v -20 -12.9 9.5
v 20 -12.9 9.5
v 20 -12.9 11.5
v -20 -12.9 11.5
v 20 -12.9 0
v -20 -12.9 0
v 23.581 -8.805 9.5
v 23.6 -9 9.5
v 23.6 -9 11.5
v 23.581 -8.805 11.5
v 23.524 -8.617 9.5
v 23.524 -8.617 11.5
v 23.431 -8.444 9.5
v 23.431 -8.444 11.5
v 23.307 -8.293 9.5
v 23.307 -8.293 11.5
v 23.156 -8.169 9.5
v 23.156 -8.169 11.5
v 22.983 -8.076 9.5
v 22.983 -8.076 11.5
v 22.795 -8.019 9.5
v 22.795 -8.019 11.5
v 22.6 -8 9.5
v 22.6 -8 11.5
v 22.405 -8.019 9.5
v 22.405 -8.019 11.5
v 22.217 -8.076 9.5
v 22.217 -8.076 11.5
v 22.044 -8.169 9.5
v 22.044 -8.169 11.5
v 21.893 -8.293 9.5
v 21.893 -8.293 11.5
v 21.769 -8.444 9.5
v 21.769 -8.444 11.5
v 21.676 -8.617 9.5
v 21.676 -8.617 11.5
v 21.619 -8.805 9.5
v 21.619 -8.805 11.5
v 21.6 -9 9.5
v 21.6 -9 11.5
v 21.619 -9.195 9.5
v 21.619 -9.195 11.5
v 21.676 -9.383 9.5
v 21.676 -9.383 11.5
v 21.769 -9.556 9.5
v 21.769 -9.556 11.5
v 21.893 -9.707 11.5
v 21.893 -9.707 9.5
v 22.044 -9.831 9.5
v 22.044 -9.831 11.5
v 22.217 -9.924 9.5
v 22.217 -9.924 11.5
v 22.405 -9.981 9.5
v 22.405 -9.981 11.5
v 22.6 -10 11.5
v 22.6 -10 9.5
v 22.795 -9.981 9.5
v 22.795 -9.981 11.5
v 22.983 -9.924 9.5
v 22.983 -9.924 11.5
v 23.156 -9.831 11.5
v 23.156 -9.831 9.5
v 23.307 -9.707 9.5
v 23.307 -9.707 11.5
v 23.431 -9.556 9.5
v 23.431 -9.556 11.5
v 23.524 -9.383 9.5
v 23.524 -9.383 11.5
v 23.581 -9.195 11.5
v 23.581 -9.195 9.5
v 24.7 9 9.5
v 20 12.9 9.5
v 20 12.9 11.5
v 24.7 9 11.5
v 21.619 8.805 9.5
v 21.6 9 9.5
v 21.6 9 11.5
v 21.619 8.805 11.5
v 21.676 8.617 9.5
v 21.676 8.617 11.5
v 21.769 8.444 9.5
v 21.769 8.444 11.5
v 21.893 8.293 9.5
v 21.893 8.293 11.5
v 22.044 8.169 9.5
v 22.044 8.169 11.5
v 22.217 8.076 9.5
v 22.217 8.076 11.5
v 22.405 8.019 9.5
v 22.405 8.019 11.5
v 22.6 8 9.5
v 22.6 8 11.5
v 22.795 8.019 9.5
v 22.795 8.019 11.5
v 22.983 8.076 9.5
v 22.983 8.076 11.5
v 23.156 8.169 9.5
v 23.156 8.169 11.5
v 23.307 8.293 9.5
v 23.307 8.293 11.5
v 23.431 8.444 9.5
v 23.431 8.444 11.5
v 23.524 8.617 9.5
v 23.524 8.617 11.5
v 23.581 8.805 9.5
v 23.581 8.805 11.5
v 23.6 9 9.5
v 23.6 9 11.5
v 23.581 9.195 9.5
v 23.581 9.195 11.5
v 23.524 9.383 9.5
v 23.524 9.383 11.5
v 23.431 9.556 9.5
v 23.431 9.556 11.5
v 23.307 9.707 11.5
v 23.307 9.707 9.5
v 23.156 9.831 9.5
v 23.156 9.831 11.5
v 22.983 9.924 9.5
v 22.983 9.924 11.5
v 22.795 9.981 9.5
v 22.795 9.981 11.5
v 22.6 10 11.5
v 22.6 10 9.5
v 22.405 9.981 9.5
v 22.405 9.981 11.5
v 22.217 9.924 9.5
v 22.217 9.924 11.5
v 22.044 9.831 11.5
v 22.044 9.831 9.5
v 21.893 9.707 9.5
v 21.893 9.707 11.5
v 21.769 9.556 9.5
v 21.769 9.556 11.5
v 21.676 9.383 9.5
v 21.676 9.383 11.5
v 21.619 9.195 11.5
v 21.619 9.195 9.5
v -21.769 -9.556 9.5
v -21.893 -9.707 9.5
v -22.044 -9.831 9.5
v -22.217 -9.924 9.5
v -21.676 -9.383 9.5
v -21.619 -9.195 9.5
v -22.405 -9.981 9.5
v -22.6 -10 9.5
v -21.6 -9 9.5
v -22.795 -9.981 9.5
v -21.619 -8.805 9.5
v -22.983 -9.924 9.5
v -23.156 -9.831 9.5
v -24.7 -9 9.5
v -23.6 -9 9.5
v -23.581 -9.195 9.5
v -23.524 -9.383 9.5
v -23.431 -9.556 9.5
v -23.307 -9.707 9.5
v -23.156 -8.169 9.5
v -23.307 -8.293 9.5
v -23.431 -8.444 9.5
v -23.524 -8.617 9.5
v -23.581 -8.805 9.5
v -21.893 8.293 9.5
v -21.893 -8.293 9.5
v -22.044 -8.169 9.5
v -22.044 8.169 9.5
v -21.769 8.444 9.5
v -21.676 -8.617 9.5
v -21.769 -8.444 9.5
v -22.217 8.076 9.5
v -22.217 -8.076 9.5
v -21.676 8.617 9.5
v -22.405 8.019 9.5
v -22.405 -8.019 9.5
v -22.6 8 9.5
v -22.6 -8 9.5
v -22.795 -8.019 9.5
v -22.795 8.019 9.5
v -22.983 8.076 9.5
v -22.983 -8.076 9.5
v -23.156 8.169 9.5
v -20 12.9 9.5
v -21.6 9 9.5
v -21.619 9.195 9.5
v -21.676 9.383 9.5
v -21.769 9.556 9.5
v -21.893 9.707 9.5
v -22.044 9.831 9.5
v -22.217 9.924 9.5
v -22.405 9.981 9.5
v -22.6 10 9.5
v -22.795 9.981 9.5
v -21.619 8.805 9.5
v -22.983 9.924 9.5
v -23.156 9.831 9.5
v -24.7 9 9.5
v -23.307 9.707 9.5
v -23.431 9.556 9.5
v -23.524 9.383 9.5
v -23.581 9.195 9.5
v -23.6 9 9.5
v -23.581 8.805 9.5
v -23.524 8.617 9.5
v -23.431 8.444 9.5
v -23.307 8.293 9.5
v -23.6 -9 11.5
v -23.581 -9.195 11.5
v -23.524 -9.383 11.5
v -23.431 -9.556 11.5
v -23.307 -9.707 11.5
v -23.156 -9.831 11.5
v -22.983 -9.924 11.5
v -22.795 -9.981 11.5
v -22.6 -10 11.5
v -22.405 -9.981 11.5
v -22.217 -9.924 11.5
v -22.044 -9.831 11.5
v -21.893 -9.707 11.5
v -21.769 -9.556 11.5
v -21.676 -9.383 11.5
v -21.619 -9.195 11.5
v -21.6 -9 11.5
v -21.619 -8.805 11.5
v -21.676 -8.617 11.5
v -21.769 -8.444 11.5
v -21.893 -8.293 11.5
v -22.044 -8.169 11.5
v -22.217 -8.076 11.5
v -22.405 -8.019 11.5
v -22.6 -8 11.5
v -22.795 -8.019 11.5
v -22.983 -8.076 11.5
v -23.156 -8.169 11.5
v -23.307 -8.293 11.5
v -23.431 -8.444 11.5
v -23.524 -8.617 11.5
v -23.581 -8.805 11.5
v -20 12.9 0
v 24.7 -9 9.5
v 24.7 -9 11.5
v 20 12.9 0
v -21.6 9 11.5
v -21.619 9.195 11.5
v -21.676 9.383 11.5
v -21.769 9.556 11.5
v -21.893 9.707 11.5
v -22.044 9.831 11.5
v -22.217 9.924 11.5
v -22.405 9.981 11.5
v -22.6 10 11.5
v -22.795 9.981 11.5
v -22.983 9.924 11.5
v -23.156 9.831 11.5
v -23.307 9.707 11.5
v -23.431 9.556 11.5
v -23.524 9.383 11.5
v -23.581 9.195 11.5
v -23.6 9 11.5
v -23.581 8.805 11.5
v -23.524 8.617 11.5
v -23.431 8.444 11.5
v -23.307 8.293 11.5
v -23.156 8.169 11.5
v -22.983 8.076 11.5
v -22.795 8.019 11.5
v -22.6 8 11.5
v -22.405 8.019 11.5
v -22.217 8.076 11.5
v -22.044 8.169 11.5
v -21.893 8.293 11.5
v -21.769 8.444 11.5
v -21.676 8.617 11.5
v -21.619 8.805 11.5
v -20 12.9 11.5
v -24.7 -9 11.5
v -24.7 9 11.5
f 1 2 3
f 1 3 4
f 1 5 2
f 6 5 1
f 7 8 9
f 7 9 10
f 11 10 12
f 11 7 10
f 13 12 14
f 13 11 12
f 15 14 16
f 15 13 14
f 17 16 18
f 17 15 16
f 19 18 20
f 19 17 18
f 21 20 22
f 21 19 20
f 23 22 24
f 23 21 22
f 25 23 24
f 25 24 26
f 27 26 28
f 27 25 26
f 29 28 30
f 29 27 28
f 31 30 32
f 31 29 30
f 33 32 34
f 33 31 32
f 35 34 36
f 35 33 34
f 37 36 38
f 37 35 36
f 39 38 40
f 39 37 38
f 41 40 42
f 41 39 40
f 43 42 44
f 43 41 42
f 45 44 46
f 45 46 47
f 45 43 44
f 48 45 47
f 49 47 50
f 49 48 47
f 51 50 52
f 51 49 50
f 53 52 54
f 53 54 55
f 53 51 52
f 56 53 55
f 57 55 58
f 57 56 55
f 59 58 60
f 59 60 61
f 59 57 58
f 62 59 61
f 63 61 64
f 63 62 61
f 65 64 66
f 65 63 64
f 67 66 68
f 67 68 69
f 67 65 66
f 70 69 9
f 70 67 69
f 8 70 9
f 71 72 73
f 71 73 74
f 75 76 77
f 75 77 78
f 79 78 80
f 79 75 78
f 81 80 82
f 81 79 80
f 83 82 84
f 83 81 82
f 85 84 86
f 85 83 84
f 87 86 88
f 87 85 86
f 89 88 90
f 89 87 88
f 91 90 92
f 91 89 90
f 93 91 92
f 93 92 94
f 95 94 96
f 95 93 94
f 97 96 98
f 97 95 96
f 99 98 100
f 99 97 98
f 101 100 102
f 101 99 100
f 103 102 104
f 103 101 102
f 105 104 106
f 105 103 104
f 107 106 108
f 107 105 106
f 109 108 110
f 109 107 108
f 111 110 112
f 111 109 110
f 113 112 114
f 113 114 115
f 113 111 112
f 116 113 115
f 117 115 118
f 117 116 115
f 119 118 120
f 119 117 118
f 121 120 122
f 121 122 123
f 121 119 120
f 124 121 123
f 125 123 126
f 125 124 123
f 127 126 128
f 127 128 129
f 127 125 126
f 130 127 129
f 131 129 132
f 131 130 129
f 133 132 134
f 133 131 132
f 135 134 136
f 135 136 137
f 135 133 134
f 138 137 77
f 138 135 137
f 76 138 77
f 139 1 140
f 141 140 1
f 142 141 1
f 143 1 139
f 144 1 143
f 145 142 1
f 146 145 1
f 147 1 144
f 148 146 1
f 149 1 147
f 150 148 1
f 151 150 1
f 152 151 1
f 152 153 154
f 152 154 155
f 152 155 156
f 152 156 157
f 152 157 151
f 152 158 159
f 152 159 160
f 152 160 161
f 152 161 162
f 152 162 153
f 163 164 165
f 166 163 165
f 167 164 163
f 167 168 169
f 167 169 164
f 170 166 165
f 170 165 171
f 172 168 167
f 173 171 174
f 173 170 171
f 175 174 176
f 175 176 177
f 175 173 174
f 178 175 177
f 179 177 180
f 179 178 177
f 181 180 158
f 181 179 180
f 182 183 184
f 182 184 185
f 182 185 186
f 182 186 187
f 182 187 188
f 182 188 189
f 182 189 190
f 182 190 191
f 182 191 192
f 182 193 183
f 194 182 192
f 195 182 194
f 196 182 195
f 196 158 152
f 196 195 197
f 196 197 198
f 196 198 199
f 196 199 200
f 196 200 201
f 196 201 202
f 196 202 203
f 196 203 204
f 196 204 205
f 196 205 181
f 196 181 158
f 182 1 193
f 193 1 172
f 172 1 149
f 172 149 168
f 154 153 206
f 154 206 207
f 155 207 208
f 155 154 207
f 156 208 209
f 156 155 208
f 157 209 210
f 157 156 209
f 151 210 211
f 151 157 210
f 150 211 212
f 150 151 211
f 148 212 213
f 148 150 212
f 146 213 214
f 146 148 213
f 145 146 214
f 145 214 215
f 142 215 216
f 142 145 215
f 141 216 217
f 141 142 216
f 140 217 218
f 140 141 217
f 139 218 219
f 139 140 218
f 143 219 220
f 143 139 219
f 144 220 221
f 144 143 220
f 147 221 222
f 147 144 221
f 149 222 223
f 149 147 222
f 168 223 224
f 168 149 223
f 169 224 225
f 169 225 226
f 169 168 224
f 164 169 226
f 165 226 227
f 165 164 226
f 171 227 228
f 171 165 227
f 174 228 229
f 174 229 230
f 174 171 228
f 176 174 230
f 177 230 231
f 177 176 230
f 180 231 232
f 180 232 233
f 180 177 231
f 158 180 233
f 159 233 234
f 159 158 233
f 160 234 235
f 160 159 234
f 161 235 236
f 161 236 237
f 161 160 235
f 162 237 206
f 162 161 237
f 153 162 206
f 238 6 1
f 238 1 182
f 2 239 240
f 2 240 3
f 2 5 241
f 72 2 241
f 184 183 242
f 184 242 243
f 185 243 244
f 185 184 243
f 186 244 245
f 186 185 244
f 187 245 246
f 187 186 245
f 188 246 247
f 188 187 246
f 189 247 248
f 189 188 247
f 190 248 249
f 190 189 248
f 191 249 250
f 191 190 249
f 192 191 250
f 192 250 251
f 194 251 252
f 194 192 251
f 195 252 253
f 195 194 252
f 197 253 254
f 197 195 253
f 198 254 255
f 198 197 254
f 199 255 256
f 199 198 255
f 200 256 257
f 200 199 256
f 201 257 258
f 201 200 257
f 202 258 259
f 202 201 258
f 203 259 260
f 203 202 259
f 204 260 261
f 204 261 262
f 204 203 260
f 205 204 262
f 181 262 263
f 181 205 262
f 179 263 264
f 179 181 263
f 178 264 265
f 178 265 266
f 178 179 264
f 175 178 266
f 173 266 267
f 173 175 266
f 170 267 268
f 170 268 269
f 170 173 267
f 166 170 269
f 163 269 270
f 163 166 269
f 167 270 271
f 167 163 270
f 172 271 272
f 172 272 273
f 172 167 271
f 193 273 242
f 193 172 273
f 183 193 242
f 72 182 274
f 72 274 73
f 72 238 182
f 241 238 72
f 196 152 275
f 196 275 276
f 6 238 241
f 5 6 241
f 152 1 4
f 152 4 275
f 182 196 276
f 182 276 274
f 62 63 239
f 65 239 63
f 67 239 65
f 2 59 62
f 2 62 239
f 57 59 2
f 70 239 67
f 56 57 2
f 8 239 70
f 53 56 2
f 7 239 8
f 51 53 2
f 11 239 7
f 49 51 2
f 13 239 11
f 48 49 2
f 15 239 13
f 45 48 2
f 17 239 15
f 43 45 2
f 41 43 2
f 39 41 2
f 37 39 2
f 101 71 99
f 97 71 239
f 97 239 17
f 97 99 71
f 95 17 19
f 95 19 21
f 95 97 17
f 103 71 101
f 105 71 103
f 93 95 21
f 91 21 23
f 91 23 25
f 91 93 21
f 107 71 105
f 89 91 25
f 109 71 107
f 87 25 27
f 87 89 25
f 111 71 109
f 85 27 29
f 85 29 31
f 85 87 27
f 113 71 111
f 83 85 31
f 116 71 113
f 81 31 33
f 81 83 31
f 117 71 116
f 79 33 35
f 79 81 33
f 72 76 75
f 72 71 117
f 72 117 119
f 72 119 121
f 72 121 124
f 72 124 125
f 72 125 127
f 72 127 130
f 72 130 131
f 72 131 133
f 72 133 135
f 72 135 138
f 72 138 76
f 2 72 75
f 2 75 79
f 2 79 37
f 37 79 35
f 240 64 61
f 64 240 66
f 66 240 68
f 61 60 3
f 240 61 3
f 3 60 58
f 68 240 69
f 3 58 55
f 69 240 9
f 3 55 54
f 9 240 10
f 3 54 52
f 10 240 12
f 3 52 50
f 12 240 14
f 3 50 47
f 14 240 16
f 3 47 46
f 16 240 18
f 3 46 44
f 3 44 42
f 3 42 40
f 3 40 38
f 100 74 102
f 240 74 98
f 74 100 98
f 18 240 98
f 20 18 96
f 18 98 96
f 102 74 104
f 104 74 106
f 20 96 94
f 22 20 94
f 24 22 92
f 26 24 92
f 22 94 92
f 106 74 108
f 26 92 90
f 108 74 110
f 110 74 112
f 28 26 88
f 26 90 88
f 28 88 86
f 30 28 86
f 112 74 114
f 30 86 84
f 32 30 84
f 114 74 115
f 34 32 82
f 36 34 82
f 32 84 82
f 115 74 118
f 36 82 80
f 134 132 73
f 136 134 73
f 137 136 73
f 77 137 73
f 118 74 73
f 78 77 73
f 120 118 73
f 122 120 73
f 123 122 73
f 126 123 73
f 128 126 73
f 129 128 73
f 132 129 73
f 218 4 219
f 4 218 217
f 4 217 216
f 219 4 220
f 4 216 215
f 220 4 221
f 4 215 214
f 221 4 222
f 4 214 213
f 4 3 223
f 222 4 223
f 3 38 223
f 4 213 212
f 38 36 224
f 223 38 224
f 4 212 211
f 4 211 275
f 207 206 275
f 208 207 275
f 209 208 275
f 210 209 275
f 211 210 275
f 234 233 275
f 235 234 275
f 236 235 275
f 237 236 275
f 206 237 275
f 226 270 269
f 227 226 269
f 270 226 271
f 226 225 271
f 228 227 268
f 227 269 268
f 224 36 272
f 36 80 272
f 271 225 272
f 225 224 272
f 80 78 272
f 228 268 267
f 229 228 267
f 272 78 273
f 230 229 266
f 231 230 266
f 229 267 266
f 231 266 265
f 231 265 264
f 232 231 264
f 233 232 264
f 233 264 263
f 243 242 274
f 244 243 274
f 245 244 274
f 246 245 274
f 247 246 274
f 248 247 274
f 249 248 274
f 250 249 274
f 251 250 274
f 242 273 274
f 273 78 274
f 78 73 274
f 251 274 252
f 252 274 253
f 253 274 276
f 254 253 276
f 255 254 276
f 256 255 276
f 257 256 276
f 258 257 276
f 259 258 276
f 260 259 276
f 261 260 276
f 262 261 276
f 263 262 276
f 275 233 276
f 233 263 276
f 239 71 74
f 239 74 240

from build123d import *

# Parameters (mm, degrees)
SKETCH_1_W      = 40
SKETCH_1_H      = 25.8
EXTRUDE_1_DEPTH = 9.5
SKETCH_2_R      = 1
EXTRUDE_2_DEPTH = 2


with BuildPart() as part:
    # 草图1 → 凸台-拉伸1 (new body)
    with BuildSketch(Plane.XY):
        Rectangle(SKETCH_1_W, SKETCH_1_H)
    extrude(amount=EXTRUDE_1_DEPTH)

    # 草图2 → 凸台-拉伸2 (add)
    with BuildSketch(Plane.XY.offset(9.5)):
        Polygon((-20, 12.9), (20, 12.9), (24.7, 9), (24.7, -9), (20, -12.9), (-20, -12.9), (-24.7, -9), (-24.7, 9), align=None)
        with Locations((-22.6, 9)):
            Circle(SKETCH_2_R, mode=Mode.SUBTRACT)
        with Locations(Location((22.6, 9, 0), (0, 0, 180))):
            Circle(SKETCH_2_R, mode=Mode.SUBTRACT)
        with Locations((22.6, -9)):
            Circle(SKETCH_2_R, mode=Mode.SUBTRACT)
        with Locations(Location((-22.6, -9, 0), (0, 0, 180))):
            Circle(SKETCH_2_R, mode=Mode.SUBTRACT)
    extrude(amount=EXTRUDE_2_DEPTH)


solid = part.part
